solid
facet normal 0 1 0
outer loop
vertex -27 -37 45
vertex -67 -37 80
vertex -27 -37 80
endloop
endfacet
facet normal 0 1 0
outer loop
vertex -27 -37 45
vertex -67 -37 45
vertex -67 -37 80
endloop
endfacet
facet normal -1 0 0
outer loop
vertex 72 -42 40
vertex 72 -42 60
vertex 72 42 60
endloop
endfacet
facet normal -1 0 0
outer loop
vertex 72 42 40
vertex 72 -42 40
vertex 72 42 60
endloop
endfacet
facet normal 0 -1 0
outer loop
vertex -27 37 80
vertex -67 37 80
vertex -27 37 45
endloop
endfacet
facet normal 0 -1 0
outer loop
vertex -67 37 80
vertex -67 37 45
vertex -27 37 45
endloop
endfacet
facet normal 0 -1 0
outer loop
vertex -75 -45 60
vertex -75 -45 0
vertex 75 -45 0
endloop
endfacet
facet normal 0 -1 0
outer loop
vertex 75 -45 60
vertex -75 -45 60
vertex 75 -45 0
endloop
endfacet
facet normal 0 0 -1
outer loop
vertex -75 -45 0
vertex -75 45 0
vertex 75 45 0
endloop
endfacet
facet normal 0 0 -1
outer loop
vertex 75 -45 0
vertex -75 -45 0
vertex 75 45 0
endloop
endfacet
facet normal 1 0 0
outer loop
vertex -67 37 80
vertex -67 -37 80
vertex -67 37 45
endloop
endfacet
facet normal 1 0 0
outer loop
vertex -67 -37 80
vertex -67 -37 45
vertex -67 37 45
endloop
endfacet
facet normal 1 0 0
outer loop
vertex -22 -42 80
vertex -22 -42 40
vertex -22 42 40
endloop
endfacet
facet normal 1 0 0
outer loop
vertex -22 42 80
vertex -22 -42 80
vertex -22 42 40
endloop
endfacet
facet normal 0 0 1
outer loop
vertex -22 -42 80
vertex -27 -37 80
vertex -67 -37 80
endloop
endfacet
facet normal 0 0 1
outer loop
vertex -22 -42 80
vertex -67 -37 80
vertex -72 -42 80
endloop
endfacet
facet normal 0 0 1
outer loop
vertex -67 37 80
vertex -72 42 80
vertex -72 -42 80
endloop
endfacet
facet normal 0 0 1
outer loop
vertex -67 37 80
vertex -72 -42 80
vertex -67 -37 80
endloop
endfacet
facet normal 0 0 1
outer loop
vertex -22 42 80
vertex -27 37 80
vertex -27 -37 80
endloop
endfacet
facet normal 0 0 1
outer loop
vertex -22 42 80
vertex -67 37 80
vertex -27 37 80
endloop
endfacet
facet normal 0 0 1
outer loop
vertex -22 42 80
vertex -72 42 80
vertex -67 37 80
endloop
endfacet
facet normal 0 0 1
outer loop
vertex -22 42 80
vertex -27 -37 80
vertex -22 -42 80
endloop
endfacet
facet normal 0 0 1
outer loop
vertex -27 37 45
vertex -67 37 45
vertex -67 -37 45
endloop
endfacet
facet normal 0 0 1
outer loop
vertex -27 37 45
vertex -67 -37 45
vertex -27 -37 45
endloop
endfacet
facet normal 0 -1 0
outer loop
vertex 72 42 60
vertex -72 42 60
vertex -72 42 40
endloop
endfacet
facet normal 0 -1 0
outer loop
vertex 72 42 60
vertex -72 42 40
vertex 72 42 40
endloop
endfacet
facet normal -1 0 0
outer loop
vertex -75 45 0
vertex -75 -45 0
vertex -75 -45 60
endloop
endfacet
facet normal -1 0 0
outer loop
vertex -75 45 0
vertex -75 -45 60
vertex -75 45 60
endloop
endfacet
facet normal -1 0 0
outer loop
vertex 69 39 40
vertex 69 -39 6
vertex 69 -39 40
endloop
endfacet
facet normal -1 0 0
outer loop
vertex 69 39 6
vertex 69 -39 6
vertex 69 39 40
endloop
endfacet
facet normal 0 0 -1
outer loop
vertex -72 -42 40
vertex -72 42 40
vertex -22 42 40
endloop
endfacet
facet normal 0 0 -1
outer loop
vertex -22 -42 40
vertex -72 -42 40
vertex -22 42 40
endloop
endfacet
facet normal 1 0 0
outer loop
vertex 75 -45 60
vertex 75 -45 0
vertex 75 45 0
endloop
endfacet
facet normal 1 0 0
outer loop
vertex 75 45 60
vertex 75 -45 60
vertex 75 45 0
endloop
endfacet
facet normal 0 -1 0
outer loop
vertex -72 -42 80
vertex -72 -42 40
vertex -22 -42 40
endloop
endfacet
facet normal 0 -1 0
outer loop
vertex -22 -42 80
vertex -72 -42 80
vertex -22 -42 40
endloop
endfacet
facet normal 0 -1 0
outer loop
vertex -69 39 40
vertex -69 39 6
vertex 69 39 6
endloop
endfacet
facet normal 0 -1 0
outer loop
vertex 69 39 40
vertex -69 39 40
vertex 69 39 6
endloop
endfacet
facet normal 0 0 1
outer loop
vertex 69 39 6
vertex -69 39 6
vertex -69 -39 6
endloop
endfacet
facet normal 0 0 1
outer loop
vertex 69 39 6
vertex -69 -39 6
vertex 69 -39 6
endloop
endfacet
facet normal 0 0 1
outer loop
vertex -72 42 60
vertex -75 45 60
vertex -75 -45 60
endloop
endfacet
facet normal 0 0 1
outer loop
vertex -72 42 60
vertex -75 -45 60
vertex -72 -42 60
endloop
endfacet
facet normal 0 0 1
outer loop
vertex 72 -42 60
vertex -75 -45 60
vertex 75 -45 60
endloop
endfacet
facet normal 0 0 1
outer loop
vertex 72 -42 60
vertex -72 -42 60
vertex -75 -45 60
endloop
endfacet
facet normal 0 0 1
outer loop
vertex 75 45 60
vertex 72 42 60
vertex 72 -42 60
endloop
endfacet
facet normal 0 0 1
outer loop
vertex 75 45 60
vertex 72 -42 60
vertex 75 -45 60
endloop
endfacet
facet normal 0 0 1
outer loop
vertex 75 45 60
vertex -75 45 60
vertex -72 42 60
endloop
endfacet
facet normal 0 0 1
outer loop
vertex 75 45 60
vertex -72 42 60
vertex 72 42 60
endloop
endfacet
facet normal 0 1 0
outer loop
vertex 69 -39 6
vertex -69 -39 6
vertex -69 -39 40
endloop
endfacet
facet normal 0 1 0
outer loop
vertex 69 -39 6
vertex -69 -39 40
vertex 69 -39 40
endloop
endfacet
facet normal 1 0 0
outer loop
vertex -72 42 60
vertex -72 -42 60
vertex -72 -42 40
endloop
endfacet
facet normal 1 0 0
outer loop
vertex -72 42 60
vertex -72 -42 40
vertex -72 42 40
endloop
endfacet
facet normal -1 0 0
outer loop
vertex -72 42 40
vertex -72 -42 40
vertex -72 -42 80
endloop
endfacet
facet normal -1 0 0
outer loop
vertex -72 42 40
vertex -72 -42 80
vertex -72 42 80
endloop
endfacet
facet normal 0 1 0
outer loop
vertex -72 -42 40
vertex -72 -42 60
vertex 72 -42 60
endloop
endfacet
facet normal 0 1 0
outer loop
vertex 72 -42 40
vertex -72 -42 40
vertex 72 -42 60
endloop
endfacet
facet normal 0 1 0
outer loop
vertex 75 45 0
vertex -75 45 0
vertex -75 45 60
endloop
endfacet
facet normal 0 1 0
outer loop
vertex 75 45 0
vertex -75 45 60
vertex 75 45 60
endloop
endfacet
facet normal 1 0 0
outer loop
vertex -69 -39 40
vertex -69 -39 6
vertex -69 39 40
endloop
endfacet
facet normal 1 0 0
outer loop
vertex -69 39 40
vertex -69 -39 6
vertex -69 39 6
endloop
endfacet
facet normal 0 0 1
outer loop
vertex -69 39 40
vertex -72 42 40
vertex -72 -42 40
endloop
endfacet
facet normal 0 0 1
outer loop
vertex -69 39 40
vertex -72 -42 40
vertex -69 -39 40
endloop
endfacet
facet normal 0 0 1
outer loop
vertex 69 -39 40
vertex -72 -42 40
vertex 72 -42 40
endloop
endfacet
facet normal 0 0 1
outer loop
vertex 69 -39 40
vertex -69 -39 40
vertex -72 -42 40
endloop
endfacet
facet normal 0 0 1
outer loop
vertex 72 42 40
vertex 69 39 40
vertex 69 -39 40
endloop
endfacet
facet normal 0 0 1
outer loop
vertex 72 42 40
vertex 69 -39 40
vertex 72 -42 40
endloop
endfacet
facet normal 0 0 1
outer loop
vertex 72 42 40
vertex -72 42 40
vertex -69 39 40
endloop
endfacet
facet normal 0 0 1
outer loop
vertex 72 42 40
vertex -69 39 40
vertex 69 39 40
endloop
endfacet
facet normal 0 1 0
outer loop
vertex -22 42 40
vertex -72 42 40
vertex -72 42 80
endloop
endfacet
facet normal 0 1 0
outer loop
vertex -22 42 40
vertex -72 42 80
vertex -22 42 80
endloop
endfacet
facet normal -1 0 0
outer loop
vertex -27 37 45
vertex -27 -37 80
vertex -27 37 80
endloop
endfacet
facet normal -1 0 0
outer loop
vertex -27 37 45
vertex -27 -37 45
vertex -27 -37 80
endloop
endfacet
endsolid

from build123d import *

# Parameters (mm, degrees)
F0_W     = 150
F0_H     = 90
F1_DEPTH = 60
F2_T     = -6
F3_W     = 144
F3_H     = 84
F4_DEPTH = 20
F5_W     = 50
F5_H     = 84
F6_DEPTH = 40
F7_T     = -5


with BuildPart() as f1:
    # F0 (on Top) → F1 (new body)
    with BuildSketch(Plane.XY):
        Rectangle(F0_W, F0_H)
    extrude(amount=F1_DEPTH)

    # F2
    f2_openings = [f1.faces().sort_by_distance(p)[0] for p in [
        (0, 0, 60),
    ]]
    offset(amount=F2_T, openings=f2_openings)

    # F3 (on face) → F4 (cut)
    with BuildSketch(Plane.XY.offset(60)):
        Rectangle(F3_W, F3_H)
    extrude(amount=-F4_DEPTH, mode=Mode.SUBTRACT)


with BuildPart() as f6:
    # F5 (on face) → F6 (new body)
    with BuildSketch(Plane.XY.offset(40)):
        with Locations((-47, 0)):
            Rectangle(F5_W, F5_H)
    extrude(amount=F6_DEPTH)

    # F7
    f7_openings = [f6.faces().sort_by_distance(p)[0] for p in [
        (-47, 0, 80),
    ]]
    offset(amount=F7_T, openings=f7_openings)


solid = Compound([f1.part, f6.part])
